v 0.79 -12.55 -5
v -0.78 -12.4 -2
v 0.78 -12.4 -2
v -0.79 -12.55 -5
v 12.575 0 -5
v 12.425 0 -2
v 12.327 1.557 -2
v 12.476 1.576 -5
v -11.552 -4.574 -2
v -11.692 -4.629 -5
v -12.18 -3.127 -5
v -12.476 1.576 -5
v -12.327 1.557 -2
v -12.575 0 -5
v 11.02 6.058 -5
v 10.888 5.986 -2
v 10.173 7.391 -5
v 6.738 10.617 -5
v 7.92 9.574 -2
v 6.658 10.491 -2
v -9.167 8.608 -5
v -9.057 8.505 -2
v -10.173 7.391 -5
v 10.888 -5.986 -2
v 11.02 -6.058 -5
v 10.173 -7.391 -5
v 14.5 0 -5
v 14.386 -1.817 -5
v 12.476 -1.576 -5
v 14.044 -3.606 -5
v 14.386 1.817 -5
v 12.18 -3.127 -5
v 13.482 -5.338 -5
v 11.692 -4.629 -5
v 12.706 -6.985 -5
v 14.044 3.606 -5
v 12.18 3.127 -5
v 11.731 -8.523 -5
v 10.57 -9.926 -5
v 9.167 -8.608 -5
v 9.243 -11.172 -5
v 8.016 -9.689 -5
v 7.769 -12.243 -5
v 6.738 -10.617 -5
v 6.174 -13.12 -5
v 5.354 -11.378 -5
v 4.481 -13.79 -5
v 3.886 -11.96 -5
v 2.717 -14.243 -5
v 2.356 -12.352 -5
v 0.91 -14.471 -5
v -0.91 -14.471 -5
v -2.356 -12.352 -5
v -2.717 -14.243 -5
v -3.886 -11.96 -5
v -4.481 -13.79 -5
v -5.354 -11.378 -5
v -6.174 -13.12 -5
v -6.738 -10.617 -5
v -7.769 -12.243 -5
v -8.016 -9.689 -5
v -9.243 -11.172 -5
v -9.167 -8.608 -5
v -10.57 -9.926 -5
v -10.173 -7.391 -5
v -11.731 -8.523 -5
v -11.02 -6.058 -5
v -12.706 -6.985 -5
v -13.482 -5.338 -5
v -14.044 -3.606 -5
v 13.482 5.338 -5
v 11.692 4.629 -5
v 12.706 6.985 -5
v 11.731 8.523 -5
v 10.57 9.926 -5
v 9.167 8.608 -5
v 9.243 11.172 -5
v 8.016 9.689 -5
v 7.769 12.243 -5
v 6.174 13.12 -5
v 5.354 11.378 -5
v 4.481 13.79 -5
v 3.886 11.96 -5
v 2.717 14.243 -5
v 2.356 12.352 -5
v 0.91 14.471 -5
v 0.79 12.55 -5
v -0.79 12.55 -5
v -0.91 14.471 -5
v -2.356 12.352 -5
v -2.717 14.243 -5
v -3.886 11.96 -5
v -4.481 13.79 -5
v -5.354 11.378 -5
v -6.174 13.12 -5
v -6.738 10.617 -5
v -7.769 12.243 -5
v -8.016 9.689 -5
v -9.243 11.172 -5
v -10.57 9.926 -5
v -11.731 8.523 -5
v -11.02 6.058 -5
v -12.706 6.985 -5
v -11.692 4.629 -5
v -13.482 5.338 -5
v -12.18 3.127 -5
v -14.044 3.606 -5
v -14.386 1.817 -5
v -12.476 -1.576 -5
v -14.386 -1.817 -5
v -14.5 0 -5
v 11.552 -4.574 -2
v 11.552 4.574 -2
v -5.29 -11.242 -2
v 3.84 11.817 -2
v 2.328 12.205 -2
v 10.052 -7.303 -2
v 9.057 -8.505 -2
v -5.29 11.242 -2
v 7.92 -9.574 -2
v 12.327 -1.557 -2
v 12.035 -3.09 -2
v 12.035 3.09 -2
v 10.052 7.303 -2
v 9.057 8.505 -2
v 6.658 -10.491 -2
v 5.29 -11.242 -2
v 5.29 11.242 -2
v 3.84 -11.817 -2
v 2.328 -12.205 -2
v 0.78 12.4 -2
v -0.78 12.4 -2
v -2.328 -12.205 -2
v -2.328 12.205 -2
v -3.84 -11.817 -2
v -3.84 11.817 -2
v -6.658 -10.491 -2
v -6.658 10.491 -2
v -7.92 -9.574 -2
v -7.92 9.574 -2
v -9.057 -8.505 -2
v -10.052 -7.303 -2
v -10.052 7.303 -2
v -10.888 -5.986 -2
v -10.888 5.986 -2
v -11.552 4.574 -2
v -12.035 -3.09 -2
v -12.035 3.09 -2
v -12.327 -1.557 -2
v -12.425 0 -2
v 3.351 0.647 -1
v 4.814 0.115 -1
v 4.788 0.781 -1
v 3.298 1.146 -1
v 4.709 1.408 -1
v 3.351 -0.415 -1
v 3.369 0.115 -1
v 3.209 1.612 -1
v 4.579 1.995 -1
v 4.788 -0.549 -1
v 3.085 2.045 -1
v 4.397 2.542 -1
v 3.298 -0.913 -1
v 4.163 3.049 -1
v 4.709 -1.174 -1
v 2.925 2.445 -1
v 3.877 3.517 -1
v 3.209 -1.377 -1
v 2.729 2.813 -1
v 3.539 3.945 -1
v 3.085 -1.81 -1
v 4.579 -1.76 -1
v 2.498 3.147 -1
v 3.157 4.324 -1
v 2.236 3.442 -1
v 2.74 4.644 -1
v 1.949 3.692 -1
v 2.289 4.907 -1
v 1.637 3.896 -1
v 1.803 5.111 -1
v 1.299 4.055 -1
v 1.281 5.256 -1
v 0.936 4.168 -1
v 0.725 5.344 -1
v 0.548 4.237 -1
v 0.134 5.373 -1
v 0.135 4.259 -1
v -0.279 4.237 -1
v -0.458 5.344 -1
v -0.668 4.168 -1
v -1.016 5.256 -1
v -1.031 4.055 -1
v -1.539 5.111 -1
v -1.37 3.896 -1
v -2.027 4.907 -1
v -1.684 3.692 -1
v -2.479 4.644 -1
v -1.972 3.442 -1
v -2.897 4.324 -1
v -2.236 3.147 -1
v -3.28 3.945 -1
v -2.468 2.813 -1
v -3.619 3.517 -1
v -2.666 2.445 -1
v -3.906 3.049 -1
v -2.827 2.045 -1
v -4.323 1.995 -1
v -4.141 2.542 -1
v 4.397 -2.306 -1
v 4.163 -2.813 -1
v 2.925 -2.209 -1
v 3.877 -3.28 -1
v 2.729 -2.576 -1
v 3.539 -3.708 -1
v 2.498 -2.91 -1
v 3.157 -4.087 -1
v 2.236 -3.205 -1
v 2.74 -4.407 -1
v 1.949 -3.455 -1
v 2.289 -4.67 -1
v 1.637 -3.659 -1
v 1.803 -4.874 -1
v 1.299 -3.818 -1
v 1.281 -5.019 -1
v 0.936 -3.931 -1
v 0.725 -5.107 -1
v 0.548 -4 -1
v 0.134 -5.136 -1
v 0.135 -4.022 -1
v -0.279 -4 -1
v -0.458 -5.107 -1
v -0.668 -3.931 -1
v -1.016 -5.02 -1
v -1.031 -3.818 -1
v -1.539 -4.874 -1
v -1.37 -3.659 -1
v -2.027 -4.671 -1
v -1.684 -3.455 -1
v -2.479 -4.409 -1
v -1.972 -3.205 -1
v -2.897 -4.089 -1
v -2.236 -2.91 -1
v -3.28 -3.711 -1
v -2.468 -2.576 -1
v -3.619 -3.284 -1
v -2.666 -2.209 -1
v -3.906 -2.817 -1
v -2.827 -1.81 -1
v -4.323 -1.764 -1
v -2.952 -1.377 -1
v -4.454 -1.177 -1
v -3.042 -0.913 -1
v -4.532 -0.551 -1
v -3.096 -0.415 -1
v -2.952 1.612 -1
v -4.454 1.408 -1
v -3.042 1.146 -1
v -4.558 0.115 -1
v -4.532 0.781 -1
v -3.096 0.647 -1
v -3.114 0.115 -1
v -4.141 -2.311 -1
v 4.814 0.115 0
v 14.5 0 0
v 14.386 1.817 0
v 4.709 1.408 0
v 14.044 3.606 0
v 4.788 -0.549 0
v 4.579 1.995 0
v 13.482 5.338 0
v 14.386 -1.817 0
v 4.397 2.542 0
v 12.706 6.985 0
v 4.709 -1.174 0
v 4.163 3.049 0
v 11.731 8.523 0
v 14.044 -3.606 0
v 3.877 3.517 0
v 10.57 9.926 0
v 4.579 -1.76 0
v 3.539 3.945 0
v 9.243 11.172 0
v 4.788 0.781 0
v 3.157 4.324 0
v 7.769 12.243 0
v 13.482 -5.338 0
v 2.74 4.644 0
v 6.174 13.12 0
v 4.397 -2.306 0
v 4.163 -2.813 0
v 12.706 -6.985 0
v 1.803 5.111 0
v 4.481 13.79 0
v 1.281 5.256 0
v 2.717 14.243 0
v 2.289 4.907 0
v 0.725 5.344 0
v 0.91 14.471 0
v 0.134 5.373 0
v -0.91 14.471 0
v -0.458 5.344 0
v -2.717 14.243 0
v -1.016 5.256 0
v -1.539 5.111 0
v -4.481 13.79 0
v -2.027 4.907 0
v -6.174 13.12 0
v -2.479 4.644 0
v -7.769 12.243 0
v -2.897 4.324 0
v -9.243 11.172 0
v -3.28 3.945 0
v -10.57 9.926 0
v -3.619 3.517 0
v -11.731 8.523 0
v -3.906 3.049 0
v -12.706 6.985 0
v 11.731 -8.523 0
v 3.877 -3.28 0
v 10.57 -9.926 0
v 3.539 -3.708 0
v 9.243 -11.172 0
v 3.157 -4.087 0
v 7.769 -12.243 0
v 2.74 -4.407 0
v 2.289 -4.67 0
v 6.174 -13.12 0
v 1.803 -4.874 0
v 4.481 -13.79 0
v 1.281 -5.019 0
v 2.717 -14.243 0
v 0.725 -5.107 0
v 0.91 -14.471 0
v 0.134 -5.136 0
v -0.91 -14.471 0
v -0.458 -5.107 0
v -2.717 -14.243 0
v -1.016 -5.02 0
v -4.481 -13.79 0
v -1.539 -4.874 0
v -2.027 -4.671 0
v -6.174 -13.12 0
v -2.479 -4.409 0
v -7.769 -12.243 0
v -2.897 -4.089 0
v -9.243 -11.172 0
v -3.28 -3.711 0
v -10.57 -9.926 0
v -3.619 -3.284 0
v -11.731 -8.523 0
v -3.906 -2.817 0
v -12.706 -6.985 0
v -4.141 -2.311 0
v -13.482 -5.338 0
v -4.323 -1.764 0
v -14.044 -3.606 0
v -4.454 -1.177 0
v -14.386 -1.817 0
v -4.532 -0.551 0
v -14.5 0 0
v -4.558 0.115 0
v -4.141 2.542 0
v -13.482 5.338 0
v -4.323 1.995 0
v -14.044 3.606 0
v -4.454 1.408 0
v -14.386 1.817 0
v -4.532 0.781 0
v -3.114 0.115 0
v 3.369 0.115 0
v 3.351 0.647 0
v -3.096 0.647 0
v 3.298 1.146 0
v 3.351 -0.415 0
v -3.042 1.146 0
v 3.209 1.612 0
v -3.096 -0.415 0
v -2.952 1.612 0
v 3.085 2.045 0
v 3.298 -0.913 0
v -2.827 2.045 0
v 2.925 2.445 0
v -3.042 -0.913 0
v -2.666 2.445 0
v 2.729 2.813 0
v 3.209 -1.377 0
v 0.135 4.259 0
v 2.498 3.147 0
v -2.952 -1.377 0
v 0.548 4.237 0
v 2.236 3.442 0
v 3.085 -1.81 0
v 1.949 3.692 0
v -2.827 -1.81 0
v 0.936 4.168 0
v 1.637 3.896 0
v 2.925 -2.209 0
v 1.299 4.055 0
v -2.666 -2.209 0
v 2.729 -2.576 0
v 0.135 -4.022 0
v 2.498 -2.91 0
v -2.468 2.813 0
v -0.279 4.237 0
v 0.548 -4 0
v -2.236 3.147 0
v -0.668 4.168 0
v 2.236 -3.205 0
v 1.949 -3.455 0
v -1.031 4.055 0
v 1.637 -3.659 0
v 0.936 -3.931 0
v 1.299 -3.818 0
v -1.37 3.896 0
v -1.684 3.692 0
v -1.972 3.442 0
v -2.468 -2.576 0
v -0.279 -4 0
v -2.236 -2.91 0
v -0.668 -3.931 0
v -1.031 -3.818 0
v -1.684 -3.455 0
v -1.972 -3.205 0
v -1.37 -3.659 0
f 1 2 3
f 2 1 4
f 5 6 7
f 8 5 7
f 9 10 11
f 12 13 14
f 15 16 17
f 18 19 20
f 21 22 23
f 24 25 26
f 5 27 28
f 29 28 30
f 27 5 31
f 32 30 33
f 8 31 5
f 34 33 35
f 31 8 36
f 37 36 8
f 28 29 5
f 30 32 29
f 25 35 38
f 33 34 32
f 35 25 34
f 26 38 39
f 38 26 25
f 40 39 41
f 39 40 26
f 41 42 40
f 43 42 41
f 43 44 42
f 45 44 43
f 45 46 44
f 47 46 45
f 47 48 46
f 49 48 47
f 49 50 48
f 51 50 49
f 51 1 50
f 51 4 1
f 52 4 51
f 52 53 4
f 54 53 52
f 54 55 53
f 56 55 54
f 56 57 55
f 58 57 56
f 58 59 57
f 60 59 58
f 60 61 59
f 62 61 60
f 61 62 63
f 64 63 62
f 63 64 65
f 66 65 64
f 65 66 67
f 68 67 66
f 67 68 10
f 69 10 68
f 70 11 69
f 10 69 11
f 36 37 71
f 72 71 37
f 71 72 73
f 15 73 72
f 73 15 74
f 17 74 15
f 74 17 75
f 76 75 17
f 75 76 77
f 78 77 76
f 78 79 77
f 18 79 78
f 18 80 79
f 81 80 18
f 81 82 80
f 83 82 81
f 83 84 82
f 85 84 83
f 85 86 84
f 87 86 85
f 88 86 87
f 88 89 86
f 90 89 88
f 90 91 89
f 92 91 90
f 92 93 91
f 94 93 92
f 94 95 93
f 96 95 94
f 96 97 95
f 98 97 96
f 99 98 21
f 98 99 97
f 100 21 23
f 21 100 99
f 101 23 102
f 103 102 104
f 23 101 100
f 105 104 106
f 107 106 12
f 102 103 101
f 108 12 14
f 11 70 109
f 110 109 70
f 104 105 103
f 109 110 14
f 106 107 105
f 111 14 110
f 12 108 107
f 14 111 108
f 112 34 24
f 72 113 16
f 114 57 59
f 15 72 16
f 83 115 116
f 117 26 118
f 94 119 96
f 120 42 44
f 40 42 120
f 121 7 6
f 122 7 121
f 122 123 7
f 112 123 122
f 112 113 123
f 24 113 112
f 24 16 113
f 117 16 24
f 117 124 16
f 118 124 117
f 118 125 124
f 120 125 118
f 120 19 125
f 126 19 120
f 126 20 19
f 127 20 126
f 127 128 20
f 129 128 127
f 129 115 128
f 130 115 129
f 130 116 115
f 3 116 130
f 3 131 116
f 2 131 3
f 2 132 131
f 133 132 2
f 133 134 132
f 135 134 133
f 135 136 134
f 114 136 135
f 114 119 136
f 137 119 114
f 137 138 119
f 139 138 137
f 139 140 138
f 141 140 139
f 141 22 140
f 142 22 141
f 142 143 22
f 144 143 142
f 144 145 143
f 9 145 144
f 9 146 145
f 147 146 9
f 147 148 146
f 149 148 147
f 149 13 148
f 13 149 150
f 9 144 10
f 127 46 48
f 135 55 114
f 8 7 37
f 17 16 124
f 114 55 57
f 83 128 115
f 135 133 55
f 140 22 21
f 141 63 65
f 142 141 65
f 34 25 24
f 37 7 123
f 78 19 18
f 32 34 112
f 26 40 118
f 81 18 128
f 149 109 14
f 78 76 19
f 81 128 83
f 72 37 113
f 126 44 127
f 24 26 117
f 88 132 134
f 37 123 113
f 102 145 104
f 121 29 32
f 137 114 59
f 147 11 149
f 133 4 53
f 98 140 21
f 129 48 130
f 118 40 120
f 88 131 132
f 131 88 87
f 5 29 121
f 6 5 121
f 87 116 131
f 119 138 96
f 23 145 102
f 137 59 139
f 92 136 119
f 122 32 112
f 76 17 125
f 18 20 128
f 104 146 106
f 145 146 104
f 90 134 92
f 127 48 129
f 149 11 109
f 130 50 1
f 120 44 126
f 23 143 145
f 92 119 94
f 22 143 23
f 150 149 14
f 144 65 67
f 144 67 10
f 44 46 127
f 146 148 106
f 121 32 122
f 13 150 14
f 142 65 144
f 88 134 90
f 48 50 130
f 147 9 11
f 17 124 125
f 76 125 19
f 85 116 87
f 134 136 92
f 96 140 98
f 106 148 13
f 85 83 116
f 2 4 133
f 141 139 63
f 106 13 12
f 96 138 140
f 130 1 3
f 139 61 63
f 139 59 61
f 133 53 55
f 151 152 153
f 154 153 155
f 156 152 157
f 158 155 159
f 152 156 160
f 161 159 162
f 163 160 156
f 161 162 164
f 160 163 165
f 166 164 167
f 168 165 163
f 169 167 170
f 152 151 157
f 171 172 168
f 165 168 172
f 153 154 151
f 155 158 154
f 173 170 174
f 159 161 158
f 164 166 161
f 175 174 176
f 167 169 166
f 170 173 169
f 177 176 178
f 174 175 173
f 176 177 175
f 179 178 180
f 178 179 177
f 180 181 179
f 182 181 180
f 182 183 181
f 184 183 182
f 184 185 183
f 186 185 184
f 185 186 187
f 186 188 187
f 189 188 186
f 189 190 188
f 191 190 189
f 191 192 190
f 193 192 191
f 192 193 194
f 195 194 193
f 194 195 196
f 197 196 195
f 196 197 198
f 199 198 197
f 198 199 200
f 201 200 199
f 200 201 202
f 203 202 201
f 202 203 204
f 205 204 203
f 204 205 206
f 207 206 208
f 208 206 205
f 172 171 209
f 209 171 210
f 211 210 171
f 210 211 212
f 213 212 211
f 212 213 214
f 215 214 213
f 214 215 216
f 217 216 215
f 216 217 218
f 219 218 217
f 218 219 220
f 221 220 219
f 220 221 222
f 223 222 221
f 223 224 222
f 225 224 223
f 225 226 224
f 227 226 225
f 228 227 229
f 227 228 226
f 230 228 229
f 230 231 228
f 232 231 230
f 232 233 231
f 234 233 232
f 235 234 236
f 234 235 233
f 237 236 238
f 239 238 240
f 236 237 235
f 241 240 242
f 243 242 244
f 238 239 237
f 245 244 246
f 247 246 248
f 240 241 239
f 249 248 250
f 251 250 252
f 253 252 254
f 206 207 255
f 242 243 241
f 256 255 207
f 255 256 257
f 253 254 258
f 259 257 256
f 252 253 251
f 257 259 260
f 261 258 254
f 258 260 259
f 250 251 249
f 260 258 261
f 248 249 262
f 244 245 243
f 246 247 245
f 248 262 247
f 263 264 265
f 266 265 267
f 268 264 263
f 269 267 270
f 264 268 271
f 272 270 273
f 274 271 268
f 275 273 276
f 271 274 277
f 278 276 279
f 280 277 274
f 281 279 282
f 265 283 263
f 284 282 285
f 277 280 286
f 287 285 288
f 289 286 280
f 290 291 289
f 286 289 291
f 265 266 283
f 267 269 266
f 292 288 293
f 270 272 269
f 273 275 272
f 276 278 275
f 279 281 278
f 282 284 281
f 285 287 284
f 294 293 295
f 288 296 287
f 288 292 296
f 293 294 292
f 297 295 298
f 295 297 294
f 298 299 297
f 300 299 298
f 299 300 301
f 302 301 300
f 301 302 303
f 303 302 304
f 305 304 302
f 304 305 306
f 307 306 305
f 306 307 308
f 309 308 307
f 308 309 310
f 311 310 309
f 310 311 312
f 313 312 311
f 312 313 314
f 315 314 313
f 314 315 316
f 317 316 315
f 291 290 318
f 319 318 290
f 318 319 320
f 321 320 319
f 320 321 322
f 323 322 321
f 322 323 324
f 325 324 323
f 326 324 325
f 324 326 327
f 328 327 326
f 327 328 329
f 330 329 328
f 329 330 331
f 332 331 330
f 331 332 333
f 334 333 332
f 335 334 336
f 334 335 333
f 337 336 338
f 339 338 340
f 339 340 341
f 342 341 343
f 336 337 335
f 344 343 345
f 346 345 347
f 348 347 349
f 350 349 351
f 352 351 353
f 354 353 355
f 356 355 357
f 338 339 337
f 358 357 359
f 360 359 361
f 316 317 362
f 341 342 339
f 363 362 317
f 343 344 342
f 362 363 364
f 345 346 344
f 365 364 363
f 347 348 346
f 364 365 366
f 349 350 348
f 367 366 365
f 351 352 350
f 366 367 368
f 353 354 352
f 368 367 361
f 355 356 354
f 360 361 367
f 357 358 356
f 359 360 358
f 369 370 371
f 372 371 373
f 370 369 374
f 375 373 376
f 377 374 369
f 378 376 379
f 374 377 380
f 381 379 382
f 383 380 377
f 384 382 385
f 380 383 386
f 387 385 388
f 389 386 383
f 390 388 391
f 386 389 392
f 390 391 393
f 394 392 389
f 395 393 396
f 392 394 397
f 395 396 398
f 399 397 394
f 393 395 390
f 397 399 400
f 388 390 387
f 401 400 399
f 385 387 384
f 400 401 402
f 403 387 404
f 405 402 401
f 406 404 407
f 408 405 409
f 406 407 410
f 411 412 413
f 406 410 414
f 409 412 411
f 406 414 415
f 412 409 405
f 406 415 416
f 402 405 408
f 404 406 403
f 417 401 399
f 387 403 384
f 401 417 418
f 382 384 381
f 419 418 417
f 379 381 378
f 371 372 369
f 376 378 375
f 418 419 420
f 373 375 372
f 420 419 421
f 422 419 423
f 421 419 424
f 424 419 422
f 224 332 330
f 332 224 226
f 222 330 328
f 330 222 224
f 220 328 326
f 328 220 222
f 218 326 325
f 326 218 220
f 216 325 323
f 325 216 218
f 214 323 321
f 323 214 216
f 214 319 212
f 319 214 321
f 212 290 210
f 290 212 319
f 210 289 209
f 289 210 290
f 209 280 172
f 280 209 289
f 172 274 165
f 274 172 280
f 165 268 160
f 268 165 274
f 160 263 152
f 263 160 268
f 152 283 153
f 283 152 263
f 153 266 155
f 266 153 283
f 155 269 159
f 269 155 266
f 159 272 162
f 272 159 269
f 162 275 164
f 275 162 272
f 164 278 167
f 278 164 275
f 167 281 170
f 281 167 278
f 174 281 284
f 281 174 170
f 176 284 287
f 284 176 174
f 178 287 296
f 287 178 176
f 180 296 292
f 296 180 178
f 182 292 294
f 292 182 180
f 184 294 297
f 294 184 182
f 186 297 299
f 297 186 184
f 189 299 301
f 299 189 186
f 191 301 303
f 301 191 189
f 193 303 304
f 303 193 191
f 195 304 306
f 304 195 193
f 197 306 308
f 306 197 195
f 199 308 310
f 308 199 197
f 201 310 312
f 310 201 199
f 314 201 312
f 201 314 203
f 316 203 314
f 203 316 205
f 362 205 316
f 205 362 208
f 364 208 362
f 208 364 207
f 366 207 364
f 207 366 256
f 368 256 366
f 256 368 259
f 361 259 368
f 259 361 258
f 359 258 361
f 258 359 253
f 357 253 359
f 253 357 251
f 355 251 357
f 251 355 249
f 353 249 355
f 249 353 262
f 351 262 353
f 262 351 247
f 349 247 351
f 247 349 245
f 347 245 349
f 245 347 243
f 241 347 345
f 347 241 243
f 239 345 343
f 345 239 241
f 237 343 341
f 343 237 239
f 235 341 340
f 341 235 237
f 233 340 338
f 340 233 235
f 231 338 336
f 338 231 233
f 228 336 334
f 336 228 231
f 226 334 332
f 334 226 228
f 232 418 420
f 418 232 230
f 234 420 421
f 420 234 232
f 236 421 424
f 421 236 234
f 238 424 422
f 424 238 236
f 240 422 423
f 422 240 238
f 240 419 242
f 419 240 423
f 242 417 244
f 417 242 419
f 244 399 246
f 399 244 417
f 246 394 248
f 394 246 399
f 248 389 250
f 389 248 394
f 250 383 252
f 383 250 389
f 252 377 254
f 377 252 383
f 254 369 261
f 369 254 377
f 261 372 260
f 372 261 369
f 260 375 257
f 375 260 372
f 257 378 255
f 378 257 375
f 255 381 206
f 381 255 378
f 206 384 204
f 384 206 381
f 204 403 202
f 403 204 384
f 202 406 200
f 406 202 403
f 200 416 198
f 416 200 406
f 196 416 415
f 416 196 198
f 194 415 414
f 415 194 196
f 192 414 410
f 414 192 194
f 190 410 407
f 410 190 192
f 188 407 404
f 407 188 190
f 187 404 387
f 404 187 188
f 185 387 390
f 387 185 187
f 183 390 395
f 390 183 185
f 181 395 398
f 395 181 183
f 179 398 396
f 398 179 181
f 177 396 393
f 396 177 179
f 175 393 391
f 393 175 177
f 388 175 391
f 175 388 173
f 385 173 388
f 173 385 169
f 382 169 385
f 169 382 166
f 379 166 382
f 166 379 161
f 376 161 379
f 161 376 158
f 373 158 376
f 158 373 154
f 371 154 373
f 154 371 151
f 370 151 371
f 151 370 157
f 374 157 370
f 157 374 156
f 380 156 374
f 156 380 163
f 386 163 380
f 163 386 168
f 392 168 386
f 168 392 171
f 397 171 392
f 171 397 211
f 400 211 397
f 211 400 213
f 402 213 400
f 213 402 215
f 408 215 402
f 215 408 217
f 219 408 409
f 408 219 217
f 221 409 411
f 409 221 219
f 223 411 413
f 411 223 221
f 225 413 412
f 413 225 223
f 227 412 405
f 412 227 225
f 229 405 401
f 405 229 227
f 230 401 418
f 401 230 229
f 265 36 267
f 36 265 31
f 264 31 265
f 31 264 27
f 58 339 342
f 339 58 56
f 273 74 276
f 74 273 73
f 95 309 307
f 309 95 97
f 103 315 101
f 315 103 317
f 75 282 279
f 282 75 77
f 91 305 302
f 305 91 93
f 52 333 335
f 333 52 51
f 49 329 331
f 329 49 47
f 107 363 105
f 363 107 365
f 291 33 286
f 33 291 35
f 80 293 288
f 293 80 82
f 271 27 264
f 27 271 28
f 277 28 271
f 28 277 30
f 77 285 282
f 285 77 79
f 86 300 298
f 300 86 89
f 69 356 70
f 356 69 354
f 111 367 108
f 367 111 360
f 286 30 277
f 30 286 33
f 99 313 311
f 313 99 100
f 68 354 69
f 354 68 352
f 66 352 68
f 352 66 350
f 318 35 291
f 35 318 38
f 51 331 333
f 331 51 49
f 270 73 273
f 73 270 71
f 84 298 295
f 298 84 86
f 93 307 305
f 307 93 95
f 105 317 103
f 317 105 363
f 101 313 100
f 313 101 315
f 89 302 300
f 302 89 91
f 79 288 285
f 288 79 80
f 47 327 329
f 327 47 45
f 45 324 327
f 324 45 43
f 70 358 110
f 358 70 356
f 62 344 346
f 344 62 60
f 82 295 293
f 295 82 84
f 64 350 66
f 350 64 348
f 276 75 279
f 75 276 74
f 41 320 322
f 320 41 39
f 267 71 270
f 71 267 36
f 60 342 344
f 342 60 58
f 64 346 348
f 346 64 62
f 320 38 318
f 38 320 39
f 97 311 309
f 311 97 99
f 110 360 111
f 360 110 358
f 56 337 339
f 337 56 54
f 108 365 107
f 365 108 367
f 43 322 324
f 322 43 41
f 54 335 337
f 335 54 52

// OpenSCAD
$fn = 50;


difference() {
	union() {
		translate(v = [0, 0, -5.0000000000]) {
			cylinder(h = 5, r = 14.5000000000);
		}
	}
	union() {
		#translate(v = [0, 0, -5.0000000000]) {
			cylinder(h = 3, r1 = 12.5750000000, r2 = 12.4250000000);
		}
		translate(v = [0, 0, -1]) {
			linear_extrude(height = 1) {
				text(font = "Impact", halign = "center", size = 10, text = "O", valign = "center");
			}
		}
	}
}
